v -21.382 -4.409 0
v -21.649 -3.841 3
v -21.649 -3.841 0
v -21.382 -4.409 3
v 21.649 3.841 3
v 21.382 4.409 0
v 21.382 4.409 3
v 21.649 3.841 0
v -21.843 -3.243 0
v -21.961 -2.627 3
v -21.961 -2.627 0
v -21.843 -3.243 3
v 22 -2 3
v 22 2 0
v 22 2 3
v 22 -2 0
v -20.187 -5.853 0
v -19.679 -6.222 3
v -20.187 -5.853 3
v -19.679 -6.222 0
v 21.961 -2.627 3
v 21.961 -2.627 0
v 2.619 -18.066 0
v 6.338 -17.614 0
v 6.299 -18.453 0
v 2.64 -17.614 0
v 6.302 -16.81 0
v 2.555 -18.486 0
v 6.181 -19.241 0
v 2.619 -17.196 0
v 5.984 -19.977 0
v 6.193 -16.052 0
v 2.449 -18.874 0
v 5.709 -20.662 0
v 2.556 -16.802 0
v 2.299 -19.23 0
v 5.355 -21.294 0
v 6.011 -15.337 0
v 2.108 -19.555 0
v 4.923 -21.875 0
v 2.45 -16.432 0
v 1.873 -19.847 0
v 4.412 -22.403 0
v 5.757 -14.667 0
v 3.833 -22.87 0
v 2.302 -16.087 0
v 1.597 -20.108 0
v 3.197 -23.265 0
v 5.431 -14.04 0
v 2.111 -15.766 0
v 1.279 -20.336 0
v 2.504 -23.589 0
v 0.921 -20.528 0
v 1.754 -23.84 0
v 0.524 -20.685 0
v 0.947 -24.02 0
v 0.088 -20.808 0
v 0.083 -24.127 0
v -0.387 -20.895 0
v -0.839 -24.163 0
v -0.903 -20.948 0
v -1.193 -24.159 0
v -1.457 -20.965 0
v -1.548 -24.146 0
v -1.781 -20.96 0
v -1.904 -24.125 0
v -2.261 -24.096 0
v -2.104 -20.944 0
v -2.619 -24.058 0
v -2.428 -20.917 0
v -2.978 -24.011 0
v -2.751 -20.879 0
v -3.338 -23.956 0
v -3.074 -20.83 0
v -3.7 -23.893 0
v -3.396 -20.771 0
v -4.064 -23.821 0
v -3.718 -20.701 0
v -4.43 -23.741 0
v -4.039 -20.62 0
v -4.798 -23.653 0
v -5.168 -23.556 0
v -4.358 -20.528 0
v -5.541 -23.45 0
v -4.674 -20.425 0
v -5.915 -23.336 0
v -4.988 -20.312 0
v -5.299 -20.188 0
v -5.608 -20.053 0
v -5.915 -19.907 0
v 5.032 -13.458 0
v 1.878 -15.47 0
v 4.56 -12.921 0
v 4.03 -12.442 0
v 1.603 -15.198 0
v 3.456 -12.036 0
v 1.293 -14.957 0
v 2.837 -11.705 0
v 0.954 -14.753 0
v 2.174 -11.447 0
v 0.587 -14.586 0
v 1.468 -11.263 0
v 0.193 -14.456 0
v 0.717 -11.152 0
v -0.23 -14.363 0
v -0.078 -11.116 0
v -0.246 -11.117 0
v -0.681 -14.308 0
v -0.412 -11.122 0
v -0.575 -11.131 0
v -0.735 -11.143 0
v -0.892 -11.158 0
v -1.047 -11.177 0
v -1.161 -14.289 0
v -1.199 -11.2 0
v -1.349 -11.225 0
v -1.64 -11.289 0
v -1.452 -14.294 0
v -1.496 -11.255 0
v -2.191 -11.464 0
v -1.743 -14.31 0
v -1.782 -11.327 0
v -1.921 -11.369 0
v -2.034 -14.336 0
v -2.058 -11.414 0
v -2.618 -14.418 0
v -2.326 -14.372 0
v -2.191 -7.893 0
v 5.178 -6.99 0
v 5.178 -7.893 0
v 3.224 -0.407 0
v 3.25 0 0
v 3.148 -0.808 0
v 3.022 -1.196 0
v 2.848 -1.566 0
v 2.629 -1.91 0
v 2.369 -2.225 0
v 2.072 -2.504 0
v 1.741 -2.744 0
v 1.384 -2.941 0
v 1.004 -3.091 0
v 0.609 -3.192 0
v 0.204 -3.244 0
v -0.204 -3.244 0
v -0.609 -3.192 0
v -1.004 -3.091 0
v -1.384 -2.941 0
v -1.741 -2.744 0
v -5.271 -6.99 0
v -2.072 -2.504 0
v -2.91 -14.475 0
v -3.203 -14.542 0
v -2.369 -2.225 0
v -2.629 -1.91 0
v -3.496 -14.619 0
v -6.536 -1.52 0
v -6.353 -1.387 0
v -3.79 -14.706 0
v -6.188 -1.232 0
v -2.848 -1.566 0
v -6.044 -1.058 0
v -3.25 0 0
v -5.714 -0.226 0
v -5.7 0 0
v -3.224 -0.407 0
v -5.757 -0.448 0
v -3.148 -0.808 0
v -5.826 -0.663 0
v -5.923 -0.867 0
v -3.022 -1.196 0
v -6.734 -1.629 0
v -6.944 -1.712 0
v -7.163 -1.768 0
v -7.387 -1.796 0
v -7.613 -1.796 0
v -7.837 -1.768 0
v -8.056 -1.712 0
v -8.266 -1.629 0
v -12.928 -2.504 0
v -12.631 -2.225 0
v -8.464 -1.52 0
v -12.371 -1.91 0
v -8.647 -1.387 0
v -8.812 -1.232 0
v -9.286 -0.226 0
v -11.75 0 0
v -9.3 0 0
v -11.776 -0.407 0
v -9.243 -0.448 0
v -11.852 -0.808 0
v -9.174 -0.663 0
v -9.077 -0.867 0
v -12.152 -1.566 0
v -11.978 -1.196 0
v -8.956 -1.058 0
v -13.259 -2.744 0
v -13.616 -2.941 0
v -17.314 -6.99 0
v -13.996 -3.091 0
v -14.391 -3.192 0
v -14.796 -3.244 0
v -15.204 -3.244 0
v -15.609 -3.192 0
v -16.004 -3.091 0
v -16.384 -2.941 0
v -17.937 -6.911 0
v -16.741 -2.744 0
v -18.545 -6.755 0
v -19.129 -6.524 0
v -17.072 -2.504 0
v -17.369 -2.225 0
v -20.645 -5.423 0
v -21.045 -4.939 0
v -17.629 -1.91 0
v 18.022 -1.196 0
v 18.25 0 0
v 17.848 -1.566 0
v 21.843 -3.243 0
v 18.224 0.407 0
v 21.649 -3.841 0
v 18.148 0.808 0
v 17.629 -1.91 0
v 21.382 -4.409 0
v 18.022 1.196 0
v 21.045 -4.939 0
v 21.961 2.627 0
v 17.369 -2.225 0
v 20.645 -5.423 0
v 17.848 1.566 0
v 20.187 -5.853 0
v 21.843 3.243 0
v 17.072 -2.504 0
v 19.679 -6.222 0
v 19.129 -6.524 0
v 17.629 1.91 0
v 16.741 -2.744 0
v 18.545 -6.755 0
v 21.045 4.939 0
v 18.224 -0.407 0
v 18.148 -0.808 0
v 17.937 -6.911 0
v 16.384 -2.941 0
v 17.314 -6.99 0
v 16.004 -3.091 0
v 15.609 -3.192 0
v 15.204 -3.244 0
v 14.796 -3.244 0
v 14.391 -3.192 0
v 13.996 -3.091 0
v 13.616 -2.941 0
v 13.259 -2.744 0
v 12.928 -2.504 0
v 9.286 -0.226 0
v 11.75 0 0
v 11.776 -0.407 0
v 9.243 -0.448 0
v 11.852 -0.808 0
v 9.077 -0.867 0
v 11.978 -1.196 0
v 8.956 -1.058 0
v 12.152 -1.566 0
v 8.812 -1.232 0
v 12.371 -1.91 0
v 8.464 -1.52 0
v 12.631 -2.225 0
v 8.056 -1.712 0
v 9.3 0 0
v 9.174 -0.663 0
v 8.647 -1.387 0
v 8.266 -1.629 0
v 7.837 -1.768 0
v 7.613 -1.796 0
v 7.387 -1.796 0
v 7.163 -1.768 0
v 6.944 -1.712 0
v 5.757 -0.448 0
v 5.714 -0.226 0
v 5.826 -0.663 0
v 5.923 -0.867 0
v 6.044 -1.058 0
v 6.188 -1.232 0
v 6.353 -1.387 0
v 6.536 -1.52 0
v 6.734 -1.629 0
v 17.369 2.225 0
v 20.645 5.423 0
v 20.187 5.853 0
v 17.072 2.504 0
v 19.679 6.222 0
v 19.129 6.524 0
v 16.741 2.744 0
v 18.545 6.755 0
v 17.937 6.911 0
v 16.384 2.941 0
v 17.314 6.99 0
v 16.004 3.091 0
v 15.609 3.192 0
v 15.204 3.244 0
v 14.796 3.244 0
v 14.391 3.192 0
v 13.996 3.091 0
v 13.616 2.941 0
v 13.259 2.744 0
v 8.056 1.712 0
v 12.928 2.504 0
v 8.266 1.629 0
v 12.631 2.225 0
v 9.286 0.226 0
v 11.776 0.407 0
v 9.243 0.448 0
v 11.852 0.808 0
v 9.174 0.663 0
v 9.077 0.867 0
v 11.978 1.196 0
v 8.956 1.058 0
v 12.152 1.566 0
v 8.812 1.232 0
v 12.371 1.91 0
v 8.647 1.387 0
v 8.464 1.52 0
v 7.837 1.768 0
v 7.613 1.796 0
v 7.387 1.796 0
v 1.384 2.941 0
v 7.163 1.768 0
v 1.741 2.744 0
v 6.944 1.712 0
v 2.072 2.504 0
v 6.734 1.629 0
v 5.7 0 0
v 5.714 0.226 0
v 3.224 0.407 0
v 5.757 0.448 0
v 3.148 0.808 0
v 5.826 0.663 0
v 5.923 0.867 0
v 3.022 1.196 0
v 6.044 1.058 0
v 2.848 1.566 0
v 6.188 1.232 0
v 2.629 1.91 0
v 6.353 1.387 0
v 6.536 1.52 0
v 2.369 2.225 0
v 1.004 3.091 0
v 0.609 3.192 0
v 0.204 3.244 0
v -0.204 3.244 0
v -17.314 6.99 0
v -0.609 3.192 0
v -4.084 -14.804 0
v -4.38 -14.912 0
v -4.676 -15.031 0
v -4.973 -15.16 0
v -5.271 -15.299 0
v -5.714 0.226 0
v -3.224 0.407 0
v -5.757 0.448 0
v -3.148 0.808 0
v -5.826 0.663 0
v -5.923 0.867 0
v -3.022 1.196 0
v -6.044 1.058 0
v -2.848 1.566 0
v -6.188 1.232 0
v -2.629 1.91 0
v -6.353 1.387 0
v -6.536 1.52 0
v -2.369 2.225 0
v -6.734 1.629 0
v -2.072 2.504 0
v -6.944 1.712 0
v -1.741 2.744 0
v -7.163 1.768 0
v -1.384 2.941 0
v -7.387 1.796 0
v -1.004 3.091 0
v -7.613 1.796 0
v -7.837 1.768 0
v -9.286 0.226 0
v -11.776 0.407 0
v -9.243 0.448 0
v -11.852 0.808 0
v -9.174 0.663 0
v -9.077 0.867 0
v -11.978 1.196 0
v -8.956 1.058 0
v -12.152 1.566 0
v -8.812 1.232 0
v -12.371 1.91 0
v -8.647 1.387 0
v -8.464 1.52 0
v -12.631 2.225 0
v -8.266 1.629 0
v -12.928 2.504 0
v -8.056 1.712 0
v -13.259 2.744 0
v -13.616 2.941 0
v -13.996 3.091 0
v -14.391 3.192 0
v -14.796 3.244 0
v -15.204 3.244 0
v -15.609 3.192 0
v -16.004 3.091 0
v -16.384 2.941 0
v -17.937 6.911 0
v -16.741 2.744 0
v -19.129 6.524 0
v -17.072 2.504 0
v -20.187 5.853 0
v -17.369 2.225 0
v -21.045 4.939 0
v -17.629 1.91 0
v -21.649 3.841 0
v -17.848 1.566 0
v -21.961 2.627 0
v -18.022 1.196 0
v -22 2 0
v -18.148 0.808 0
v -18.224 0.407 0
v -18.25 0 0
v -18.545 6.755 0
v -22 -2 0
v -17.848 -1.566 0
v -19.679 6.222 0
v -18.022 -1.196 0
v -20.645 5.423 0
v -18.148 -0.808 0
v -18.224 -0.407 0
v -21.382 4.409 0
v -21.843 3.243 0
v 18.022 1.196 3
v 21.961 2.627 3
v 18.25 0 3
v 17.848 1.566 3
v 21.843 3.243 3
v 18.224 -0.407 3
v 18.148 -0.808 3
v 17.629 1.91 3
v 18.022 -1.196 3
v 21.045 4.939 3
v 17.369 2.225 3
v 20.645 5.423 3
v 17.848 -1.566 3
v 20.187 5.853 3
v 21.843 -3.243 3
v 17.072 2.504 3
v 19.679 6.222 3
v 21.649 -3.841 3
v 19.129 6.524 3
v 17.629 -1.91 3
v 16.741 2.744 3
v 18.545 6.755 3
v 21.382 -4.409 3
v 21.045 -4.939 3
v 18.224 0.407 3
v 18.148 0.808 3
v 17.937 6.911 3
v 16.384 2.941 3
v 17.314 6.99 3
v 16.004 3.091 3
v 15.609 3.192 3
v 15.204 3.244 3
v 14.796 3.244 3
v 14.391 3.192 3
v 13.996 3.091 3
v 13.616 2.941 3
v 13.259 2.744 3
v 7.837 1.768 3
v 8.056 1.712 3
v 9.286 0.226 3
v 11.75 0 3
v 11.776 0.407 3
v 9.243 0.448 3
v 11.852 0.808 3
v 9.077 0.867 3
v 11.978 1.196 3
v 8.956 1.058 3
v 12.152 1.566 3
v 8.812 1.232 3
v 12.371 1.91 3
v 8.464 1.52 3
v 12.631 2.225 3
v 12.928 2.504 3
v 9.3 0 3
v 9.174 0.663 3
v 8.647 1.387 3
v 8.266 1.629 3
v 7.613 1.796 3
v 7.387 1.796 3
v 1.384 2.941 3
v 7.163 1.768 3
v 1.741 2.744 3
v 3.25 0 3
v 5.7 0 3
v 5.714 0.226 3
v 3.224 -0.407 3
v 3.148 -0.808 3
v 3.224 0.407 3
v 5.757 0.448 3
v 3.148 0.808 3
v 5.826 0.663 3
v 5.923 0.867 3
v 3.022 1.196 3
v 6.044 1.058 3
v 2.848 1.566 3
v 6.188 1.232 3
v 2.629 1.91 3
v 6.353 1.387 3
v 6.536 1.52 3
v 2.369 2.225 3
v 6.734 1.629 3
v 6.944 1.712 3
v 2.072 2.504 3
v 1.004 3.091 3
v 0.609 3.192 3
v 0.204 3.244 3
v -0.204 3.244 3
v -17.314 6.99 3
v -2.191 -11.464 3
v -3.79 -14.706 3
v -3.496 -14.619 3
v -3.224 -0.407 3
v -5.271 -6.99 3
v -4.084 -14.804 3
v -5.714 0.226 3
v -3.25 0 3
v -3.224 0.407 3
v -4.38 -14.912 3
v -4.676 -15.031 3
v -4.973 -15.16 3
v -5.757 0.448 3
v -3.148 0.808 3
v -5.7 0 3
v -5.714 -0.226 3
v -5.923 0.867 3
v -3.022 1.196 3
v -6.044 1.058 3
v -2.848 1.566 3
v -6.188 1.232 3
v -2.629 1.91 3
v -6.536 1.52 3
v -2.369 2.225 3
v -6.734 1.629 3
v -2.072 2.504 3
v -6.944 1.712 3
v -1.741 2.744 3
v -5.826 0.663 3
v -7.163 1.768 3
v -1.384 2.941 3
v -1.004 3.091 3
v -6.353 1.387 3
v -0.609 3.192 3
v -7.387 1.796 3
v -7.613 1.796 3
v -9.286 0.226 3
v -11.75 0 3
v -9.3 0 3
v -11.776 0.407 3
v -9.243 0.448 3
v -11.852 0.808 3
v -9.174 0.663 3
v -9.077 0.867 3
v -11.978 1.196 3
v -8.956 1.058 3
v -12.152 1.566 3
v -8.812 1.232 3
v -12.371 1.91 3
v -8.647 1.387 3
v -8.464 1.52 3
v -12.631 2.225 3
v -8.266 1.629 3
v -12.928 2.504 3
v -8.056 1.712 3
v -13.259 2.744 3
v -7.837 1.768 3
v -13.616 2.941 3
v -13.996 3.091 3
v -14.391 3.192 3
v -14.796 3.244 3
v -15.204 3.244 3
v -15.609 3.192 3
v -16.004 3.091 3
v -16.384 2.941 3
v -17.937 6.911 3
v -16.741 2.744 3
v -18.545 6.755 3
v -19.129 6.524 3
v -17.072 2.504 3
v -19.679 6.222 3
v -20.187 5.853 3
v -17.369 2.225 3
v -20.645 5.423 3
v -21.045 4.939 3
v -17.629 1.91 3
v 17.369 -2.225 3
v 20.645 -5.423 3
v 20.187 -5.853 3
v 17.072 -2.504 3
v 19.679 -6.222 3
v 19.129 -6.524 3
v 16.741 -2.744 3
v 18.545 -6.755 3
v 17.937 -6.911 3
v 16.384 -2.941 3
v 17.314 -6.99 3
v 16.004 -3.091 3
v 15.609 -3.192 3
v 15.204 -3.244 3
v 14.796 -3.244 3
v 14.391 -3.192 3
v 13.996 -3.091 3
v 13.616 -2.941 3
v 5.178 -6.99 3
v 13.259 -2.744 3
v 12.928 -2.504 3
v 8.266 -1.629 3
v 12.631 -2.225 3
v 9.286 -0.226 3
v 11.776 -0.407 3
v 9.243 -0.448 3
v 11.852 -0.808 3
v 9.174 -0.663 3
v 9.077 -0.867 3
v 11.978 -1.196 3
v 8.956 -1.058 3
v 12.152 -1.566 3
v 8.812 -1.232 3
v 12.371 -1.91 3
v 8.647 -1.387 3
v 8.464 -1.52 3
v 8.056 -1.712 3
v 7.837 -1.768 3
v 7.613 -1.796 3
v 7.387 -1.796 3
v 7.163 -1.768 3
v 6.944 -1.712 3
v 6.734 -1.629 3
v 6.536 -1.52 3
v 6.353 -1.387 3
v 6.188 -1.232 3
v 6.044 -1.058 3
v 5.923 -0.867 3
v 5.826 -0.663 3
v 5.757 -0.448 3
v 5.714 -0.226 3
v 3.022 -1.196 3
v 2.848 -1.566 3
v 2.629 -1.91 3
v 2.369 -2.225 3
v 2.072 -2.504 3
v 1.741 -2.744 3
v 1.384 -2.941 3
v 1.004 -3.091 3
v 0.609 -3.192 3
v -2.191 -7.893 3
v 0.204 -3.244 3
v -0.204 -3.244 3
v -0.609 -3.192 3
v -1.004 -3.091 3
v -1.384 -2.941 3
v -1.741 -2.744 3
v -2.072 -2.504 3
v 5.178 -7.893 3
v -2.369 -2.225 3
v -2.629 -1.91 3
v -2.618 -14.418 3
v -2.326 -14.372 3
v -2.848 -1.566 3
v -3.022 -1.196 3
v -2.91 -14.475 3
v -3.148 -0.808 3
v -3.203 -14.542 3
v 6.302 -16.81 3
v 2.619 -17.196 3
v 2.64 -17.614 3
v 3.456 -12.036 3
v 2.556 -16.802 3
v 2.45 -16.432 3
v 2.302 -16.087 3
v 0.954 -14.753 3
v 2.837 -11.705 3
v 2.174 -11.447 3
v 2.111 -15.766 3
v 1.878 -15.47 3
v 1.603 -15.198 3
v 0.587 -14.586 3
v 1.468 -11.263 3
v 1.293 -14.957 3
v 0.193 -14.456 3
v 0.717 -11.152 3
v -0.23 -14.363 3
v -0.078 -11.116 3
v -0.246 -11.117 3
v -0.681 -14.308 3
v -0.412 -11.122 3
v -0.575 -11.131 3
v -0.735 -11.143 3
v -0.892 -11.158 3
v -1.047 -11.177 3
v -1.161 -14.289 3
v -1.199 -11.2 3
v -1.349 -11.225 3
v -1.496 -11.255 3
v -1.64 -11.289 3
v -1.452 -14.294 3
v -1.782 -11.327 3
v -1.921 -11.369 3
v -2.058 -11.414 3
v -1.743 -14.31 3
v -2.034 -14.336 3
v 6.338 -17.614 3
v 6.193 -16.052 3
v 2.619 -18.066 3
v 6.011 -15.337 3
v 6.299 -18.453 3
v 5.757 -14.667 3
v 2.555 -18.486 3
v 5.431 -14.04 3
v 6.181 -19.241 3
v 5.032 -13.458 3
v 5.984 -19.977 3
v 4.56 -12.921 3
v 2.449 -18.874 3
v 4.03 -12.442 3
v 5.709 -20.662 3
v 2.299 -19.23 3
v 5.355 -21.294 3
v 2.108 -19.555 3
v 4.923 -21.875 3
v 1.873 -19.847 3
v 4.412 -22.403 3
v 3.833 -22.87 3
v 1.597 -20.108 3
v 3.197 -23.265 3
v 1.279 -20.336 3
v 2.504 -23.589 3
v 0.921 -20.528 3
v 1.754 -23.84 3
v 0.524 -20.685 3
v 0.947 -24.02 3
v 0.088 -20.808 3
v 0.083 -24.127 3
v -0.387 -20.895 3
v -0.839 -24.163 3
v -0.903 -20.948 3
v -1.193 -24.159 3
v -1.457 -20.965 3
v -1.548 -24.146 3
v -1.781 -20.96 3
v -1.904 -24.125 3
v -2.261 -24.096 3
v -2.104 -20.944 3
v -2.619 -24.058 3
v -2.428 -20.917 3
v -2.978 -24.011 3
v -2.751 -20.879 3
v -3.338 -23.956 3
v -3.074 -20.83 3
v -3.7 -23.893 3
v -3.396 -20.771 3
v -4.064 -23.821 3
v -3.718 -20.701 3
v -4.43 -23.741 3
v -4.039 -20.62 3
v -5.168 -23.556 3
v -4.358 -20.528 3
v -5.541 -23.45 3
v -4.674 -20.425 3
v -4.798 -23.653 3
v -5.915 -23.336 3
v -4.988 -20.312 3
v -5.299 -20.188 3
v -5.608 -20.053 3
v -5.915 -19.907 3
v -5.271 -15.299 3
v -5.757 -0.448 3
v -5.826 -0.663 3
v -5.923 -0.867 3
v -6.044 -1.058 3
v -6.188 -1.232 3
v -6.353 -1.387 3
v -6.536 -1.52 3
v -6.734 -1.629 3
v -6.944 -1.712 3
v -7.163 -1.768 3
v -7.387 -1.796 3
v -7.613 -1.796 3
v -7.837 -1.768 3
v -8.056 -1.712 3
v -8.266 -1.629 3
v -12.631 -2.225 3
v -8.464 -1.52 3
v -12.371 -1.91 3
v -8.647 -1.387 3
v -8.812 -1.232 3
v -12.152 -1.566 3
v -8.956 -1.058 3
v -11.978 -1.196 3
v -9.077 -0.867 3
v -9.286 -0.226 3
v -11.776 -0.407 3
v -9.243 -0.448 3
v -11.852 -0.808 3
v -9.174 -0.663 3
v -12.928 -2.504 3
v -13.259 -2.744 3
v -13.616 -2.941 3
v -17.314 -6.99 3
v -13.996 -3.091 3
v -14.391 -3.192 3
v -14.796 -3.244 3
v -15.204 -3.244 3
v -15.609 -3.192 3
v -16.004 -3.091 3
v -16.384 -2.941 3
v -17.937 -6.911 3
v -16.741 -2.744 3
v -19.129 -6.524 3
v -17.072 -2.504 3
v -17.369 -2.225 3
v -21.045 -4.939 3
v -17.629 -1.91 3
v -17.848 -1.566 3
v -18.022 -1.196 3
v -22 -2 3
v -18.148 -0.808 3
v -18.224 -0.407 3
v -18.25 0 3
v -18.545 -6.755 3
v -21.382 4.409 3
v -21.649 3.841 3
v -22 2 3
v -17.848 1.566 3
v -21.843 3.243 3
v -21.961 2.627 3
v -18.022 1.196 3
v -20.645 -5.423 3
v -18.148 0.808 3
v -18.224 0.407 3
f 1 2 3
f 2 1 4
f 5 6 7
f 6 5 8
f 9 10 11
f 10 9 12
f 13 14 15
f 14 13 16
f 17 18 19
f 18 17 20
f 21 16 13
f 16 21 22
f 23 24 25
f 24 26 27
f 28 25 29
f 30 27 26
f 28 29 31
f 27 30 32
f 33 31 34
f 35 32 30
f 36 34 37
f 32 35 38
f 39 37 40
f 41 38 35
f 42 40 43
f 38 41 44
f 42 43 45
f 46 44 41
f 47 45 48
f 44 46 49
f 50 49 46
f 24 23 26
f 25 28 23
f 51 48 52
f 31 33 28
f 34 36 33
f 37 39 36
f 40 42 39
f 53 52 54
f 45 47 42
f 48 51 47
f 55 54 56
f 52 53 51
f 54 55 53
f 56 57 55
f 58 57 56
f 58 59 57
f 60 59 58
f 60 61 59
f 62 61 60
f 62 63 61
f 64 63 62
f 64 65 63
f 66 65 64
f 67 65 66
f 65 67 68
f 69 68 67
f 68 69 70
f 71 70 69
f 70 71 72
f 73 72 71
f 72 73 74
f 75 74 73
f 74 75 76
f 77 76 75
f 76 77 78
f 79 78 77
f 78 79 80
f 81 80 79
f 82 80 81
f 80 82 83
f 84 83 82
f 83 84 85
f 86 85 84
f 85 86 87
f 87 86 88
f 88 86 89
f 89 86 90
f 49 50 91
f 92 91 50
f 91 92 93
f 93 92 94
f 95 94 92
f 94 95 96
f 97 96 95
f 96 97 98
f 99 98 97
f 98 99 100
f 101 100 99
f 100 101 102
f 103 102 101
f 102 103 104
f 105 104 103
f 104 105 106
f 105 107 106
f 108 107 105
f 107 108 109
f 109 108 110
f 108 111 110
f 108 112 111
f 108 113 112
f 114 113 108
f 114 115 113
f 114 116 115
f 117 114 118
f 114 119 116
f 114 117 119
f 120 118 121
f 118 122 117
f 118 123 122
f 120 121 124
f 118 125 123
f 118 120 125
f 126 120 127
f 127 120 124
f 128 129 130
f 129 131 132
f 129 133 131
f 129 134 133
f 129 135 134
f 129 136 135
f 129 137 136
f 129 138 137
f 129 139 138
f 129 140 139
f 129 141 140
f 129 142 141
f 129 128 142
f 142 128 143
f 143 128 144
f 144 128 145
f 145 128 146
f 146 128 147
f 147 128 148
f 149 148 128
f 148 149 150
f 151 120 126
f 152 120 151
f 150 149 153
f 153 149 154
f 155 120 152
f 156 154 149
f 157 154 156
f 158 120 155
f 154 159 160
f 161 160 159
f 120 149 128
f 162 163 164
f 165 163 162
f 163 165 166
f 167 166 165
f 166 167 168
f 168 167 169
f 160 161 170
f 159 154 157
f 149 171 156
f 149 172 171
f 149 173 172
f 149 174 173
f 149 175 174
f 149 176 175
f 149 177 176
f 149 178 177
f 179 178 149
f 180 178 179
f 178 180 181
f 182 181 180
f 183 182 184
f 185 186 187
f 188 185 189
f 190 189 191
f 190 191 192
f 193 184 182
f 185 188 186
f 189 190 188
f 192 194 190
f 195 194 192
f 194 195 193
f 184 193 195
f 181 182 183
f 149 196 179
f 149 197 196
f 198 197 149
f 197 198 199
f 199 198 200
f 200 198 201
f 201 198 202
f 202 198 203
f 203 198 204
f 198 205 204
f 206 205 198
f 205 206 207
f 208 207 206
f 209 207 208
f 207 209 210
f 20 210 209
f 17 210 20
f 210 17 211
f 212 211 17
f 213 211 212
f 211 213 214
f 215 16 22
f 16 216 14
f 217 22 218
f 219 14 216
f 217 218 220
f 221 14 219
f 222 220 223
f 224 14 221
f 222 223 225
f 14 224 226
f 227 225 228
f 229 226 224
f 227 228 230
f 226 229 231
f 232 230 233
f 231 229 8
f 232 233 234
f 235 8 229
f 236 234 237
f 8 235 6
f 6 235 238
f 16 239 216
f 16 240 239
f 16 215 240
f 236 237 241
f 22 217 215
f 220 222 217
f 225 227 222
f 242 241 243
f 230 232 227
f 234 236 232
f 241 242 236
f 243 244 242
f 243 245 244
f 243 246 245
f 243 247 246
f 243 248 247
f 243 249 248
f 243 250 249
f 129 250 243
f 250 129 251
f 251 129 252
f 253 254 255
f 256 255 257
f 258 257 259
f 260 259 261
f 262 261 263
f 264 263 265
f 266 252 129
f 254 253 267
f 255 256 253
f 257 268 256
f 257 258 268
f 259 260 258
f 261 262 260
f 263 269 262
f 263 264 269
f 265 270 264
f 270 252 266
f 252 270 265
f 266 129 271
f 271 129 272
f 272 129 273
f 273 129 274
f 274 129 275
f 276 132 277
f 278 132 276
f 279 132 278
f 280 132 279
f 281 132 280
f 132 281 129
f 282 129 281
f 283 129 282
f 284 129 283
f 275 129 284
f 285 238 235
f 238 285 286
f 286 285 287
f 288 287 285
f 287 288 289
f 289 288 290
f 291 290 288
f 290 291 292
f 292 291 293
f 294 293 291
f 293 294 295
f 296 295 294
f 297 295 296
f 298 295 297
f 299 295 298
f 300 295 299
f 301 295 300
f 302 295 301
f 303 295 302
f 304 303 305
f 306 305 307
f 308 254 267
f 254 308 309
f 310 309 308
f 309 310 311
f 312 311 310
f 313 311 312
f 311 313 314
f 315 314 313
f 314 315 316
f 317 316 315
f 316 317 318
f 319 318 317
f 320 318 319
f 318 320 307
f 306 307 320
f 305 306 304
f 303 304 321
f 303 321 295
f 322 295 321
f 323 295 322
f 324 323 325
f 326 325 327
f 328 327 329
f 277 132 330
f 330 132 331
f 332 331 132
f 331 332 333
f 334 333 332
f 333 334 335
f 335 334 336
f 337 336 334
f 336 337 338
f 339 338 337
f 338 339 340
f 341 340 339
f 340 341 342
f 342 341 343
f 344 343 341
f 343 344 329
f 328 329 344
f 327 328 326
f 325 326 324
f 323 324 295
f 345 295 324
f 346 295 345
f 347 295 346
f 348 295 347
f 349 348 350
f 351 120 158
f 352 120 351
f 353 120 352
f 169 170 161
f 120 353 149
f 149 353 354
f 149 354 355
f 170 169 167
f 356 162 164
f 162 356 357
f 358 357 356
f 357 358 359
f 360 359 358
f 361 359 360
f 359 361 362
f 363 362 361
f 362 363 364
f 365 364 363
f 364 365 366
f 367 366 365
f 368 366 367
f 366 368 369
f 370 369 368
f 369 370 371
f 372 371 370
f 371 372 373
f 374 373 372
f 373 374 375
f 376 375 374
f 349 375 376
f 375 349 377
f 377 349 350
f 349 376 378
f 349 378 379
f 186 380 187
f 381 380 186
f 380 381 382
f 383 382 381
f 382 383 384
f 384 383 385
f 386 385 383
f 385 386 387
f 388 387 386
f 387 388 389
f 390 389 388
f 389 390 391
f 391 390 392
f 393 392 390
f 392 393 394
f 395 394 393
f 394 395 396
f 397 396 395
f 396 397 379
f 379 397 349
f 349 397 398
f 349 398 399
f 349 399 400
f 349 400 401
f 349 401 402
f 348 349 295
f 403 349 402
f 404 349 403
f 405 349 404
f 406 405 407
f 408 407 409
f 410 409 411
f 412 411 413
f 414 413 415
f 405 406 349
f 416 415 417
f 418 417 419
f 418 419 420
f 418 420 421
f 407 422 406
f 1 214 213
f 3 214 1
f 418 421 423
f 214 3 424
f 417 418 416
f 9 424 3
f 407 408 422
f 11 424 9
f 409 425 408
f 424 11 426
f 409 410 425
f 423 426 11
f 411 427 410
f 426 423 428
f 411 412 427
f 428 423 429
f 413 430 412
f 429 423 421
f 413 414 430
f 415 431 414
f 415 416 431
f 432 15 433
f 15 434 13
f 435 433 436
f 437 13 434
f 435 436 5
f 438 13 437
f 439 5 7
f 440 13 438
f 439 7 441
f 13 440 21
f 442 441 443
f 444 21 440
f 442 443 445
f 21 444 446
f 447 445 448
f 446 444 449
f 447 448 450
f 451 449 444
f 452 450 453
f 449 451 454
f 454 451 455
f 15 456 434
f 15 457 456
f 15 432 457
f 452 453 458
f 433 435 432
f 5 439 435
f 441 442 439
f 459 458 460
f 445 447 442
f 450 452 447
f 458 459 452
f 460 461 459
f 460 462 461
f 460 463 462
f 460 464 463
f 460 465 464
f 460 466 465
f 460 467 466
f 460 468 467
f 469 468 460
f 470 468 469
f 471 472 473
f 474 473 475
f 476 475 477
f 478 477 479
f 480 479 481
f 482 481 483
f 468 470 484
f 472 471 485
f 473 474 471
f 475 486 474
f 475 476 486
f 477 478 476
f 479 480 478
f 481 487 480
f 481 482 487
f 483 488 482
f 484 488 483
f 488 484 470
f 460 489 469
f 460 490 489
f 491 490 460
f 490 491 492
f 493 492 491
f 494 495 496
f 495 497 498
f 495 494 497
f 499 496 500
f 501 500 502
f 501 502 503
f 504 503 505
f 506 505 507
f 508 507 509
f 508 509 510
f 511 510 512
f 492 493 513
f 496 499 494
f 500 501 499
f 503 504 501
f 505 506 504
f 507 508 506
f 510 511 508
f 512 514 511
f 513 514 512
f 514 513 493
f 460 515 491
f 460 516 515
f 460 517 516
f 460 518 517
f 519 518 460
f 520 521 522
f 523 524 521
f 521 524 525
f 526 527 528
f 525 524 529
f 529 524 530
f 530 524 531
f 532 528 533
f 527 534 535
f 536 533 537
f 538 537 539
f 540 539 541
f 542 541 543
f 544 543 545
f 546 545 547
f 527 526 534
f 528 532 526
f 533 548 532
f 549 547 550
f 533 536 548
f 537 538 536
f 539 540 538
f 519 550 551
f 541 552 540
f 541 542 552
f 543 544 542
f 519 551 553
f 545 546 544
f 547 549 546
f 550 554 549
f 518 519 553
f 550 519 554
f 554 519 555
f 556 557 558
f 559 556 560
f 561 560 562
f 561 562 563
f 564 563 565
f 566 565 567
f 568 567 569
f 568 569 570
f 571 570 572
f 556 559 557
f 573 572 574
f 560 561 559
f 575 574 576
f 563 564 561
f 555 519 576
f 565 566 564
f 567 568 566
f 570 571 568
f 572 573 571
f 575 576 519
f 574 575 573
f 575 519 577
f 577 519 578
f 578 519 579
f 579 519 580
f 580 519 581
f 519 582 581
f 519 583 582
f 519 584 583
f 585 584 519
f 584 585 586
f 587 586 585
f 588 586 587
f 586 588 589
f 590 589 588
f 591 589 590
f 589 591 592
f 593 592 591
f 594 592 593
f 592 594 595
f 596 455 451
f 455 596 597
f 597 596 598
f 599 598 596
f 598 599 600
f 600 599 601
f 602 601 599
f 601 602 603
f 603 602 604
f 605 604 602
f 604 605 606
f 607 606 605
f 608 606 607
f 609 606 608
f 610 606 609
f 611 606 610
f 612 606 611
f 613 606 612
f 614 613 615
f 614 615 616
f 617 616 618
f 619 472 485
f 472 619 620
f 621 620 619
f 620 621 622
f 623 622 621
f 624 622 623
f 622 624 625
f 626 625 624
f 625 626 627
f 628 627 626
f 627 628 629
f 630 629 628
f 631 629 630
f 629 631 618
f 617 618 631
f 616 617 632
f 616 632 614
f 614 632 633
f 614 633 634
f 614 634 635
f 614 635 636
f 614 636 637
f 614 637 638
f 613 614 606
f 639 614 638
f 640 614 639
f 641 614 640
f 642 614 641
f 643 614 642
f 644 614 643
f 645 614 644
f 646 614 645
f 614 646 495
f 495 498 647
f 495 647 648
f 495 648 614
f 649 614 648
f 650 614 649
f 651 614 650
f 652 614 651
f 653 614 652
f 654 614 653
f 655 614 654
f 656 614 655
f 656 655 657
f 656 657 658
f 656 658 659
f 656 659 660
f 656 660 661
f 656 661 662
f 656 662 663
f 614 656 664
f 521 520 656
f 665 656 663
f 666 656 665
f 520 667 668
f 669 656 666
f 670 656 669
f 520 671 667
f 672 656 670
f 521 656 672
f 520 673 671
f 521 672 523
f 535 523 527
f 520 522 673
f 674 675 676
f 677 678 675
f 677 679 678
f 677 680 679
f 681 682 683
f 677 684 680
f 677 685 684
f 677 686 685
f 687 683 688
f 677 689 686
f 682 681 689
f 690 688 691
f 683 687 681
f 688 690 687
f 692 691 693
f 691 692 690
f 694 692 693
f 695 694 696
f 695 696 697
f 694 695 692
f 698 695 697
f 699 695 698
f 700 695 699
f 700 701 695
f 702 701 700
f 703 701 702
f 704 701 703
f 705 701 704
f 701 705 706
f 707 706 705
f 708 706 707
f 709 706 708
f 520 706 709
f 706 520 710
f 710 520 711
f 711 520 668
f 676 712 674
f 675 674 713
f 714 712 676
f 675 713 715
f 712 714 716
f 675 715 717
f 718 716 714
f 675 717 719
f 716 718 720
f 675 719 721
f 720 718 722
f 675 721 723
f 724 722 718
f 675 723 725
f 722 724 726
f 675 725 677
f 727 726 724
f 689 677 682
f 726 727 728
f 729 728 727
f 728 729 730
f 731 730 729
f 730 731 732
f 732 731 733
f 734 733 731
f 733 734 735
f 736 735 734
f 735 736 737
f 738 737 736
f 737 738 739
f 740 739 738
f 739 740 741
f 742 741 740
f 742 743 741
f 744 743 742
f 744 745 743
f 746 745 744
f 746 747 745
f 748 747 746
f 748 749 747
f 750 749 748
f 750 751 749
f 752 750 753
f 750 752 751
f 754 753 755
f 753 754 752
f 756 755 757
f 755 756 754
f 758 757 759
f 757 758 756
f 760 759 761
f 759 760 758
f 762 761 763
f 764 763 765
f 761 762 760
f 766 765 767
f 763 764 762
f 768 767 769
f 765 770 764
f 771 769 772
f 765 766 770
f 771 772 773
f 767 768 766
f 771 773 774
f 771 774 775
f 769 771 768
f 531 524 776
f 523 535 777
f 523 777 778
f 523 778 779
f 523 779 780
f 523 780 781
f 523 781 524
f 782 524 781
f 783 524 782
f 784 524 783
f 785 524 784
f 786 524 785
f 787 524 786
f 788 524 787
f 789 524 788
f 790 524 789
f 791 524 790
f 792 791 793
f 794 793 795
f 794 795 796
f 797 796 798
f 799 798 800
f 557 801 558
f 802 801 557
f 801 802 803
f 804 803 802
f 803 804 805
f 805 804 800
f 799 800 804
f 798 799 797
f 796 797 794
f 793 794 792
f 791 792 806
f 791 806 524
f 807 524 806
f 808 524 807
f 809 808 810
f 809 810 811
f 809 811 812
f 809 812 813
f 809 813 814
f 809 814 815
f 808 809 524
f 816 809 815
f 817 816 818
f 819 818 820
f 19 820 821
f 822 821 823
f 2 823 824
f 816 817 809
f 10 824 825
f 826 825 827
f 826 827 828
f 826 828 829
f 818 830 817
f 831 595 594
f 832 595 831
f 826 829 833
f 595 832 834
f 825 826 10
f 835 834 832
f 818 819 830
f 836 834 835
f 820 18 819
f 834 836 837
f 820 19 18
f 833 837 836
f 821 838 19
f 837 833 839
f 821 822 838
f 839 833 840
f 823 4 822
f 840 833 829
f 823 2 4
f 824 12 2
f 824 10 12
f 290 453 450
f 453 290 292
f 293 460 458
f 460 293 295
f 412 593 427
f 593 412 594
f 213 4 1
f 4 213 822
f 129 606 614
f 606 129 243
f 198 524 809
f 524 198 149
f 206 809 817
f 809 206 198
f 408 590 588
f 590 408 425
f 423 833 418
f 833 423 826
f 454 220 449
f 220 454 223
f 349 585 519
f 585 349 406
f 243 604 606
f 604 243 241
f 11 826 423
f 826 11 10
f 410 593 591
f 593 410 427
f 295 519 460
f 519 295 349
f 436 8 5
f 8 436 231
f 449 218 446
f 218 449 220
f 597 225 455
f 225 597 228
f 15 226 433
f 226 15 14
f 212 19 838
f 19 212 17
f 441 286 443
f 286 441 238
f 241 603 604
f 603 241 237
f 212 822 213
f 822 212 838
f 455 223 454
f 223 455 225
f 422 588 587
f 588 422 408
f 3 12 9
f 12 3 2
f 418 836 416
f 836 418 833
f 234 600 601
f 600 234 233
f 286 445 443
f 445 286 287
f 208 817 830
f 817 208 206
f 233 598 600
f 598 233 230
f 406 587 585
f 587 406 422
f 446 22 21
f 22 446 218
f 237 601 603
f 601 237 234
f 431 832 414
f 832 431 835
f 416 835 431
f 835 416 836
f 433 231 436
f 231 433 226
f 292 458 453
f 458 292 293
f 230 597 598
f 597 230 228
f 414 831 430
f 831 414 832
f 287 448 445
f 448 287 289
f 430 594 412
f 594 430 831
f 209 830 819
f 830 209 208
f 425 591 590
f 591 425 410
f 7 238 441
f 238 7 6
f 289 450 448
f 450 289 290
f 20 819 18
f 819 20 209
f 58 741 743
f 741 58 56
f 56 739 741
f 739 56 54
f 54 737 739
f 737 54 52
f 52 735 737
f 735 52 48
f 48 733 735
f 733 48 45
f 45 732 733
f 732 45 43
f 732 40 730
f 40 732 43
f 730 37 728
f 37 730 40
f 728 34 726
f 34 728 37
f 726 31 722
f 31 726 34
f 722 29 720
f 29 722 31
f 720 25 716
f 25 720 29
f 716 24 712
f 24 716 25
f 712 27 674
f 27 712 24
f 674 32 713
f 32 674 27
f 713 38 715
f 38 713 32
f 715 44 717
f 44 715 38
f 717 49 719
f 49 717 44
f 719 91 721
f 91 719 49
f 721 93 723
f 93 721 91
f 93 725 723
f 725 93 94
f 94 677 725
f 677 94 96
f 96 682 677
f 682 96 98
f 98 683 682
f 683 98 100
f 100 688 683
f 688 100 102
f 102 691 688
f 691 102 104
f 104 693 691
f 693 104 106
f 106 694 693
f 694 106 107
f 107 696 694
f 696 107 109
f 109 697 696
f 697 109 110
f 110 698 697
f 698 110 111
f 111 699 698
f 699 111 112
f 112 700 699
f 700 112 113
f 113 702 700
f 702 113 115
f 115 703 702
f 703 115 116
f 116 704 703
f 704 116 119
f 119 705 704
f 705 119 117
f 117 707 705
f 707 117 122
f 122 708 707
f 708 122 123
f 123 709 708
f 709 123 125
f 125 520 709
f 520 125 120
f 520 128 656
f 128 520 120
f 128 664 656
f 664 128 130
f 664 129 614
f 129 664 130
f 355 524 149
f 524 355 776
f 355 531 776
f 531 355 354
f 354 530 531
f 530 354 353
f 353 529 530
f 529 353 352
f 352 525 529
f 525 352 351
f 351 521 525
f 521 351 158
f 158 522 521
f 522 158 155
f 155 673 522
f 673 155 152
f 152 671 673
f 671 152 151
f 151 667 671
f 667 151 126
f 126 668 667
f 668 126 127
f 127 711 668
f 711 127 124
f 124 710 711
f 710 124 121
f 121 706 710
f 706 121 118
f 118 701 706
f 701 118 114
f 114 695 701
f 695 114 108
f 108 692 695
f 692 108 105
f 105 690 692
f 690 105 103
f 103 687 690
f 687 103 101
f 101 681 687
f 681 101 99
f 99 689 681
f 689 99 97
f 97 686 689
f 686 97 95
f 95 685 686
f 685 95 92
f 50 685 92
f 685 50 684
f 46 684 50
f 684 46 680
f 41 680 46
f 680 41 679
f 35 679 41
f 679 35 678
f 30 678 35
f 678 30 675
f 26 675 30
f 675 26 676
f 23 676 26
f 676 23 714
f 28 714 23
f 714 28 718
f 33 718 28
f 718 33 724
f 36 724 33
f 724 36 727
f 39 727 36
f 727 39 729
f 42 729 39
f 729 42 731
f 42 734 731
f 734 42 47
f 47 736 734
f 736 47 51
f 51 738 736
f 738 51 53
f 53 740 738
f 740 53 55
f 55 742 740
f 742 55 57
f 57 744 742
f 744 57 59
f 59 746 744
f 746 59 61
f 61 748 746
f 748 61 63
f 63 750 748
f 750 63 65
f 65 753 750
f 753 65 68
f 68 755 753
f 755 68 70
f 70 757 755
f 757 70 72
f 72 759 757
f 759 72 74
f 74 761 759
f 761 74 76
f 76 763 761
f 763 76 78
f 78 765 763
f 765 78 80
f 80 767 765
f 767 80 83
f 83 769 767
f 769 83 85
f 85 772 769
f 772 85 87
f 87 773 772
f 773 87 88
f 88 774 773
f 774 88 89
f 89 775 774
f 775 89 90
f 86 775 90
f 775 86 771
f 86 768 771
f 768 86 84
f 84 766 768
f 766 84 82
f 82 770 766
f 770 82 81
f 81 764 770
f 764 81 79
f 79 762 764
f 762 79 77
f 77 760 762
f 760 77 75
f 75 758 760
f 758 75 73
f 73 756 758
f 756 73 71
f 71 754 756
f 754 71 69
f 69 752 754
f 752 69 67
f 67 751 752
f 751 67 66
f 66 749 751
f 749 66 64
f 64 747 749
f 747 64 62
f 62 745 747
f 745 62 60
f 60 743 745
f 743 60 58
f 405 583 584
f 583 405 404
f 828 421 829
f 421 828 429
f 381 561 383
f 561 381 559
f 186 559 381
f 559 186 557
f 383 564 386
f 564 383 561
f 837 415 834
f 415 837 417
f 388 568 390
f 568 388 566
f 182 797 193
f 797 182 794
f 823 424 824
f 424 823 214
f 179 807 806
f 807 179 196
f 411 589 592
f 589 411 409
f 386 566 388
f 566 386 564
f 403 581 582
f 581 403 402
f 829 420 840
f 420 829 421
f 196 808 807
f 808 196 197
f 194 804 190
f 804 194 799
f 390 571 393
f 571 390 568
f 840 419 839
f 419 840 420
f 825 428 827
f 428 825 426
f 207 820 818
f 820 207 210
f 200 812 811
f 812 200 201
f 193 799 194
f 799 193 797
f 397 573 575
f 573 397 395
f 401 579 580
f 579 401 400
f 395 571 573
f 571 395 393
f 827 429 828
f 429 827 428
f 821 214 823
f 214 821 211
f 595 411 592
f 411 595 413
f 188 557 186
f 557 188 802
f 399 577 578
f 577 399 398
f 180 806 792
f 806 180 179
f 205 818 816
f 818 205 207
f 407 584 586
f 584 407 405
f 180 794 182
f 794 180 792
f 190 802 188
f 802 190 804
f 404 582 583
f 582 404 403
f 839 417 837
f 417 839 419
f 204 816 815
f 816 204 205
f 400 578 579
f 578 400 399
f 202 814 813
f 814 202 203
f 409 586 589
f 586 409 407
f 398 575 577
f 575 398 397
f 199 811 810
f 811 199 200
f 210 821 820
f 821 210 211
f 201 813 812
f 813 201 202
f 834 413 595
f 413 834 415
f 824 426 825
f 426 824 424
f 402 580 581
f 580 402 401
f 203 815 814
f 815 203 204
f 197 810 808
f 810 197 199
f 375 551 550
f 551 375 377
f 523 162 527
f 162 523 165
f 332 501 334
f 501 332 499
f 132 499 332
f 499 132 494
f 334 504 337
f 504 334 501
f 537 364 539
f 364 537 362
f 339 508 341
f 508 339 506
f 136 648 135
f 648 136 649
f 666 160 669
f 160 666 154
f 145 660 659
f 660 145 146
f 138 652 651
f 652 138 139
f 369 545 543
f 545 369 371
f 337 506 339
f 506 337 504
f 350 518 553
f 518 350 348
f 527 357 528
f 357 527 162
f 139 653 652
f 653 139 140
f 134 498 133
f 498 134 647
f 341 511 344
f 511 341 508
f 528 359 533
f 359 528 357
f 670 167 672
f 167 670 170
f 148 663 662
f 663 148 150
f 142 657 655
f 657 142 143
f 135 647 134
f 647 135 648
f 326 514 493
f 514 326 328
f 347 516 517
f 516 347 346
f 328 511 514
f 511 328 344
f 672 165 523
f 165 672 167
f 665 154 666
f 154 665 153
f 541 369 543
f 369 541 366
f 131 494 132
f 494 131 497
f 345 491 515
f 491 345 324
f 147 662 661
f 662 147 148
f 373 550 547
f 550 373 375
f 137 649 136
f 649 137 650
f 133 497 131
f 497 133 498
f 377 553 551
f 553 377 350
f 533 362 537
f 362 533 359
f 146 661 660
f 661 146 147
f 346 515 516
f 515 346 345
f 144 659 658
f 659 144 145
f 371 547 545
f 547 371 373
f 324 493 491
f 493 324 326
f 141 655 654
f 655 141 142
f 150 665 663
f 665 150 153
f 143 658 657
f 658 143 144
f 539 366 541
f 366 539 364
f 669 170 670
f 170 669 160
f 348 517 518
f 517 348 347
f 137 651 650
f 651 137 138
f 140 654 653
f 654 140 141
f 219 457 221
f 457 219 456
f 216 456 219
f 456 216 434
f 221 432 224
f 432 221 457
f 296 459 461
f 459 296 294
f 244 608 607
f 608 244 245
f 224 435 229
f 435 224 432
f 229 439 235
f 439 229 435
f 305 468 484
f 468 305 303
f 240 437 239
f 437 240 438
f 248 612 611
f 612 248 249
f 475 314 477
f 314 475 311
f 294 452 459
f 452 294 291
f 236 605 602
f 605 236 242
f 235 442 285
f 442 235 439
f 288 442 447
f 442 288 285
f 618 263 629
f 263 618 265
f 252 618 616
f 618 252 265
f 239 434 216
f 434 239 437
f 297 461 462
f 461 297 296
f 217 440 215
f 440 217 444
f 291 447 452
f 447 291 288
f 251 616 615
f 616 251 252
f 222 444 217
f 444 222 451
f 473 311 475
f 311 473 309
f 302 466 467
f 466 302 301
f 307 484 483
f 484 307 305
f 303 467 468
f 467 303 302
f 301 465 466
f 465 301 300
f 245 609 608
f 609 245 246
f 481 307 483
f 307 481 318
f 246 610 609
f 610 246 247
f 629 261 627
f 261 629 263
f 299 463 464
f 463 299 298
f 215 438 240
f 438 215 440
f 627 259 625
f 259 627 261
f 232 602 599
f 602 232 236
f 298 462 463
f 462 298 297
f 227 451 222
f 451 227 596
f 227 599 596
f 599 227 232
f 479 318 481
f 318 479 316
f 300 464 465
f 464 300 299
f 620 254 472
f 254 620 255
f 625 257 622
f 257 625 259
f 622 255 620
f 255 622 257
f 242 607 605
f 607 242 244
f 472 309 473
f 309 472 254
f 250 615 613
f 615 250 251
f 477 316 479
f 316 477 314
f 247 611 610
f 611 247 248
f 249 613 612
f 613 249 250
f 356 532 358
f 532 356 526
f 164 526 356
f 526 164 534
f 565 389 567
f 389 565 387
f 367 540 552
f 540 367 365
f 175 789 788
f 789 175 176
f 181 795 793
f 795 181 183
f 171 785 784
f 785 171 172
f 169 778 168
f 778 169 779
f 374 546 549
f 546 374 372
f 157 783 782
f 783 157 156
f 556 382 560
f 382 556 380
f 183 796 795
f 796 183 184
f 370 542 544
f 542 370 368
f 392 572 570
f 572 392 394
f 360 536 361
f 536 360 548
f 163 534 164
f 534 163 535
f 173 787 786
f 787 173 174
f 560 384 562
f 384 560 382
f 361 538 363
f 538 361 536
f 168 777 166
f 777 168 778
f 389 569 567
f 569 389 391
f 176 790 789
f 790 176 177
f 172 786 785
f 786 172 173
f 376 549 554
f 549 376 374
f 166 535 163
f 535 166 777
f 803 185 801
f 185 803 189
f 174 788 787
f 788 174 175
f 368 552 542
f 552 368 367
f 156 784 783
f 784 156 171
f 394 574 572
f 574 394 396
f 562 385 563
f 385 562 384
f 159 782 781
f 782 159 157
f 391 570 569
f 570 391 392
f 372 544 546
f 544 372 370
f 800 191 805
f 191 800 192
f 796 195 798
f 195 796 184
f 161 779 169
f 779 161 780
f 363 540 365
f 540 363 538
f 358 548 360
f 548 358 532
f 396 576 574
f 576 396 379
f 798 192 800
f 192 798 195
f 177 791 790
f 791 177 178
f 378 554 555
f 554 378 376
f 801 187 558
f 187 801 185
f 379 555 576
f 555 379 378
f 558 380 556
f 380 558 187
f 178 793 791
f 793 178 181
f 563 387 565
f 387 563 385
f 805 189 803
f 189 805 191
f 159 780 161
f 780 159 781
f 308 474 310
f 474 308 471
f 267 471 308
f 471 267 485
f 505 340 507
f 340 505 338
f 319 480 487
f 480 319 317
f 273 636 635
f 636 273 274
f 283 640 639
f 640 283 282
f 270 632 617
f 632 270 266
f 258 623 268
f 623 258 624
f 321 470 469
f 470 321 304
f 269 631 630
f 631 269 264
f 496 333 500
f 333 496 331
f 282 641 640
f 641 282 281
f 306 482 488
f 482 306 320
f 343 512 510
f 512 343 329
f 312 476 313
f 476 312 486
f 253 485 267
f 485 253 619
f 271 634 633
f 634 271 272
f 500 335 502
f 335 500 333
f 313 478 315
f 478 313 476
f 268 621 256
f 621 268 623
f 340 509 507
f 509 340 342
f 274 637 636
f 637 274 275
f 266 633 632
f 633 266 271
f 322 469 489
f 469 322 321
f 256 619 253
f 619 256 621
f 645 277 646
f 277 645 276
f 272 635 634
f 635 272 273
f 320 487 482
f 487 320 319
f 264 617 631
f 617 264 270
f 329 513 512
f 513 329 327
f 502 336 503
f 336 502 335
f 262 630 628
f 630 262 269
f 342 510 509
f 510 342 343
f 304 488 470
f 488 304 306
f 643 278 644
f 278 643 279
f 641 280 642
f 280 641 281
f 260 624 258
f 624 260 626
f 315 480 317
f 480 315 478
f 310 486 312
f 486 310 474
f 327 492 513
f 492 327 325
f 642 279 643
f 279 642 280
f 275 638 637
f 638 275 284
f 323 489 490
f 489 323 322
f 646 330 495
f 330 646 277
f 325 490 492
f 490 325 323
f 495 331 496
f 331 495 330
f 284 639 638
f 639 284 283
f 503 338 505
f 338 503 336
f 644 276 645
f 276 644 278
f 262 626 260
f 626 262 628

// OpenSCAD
$fn = 50;


difference() {
	union() {
		hull() {
			translate(v = [-17.0000000000, 2.0000000000, 0]) {
				cylinder(h = 3, r = 5);
			}
			translate(v = [17.0000000000, 2.0000000000, 0]) {
				cylinder(h = 3, r = 5);
			}
			translate(v = [-17.0000000000, -2.0000000000, 0]) {
				cylinder(h = 3, r = 5);
			}
			translate(v = [17.0000000000, -2.0000000000, 0]) {
				cylinder(h = 3, r = 5);
			}
		}
		translate(v = [0, -5, 0]) {
			linear_extrude(height = 3) {
				text(font = "DejaVu Sans Mono:style=Bold", halign = "center", size = 19.0000000000, text = "5", valign = "top");
			}
		}
	}
	union() {
		translate(v = [-15.0000000000, 0.0000000000, 0]) {
			translate(v = [0, 0, -100]) {
				cylinder(h = 200, r = 3.2500000000);
			}
		}
		translate(v = [0, 0, -100]) {
			cylinder(h = 200, r = 3.2500000000);
		}
		translate(v = [15.0000000000, 0.0000000000, 0]) {
			translate(v = [0, 0, -100]) {
				cylinder(h = 200, r = 3.2500000000);
			}
		}
		translate(v = [-15.0000000000, 0.0000000000, 0]) {
			translate(v = [0, 0, -100]) {
				cylinder(h = 200, r = 1.8000000000);
			}
		}
		translate(v = [-7.5000000000, 0.0000000000, 0]) {
			translate(v = [0, 0, -100]) {
				cylinder(h = 200, r = 1.8000000000);
			}
		}
		translate(v = [0, 0, -100]) {
			cylinder(h = 200, r = 1.8000000000);
		}
		translate(v = [7.5000000000, 0.0000000000, 0]) {
			translate(v = [0, 0, -100]) {
				cylinder(h = 200, r = 1.8000000000);
			}
		}
		translate(v = [15.0000000000, 0.0000000000, 0]) {
			translate(v = [0, 0, -100]) {
				cylinder(h = 200, r = 1.8000000000);
			}
		}
	}
}
